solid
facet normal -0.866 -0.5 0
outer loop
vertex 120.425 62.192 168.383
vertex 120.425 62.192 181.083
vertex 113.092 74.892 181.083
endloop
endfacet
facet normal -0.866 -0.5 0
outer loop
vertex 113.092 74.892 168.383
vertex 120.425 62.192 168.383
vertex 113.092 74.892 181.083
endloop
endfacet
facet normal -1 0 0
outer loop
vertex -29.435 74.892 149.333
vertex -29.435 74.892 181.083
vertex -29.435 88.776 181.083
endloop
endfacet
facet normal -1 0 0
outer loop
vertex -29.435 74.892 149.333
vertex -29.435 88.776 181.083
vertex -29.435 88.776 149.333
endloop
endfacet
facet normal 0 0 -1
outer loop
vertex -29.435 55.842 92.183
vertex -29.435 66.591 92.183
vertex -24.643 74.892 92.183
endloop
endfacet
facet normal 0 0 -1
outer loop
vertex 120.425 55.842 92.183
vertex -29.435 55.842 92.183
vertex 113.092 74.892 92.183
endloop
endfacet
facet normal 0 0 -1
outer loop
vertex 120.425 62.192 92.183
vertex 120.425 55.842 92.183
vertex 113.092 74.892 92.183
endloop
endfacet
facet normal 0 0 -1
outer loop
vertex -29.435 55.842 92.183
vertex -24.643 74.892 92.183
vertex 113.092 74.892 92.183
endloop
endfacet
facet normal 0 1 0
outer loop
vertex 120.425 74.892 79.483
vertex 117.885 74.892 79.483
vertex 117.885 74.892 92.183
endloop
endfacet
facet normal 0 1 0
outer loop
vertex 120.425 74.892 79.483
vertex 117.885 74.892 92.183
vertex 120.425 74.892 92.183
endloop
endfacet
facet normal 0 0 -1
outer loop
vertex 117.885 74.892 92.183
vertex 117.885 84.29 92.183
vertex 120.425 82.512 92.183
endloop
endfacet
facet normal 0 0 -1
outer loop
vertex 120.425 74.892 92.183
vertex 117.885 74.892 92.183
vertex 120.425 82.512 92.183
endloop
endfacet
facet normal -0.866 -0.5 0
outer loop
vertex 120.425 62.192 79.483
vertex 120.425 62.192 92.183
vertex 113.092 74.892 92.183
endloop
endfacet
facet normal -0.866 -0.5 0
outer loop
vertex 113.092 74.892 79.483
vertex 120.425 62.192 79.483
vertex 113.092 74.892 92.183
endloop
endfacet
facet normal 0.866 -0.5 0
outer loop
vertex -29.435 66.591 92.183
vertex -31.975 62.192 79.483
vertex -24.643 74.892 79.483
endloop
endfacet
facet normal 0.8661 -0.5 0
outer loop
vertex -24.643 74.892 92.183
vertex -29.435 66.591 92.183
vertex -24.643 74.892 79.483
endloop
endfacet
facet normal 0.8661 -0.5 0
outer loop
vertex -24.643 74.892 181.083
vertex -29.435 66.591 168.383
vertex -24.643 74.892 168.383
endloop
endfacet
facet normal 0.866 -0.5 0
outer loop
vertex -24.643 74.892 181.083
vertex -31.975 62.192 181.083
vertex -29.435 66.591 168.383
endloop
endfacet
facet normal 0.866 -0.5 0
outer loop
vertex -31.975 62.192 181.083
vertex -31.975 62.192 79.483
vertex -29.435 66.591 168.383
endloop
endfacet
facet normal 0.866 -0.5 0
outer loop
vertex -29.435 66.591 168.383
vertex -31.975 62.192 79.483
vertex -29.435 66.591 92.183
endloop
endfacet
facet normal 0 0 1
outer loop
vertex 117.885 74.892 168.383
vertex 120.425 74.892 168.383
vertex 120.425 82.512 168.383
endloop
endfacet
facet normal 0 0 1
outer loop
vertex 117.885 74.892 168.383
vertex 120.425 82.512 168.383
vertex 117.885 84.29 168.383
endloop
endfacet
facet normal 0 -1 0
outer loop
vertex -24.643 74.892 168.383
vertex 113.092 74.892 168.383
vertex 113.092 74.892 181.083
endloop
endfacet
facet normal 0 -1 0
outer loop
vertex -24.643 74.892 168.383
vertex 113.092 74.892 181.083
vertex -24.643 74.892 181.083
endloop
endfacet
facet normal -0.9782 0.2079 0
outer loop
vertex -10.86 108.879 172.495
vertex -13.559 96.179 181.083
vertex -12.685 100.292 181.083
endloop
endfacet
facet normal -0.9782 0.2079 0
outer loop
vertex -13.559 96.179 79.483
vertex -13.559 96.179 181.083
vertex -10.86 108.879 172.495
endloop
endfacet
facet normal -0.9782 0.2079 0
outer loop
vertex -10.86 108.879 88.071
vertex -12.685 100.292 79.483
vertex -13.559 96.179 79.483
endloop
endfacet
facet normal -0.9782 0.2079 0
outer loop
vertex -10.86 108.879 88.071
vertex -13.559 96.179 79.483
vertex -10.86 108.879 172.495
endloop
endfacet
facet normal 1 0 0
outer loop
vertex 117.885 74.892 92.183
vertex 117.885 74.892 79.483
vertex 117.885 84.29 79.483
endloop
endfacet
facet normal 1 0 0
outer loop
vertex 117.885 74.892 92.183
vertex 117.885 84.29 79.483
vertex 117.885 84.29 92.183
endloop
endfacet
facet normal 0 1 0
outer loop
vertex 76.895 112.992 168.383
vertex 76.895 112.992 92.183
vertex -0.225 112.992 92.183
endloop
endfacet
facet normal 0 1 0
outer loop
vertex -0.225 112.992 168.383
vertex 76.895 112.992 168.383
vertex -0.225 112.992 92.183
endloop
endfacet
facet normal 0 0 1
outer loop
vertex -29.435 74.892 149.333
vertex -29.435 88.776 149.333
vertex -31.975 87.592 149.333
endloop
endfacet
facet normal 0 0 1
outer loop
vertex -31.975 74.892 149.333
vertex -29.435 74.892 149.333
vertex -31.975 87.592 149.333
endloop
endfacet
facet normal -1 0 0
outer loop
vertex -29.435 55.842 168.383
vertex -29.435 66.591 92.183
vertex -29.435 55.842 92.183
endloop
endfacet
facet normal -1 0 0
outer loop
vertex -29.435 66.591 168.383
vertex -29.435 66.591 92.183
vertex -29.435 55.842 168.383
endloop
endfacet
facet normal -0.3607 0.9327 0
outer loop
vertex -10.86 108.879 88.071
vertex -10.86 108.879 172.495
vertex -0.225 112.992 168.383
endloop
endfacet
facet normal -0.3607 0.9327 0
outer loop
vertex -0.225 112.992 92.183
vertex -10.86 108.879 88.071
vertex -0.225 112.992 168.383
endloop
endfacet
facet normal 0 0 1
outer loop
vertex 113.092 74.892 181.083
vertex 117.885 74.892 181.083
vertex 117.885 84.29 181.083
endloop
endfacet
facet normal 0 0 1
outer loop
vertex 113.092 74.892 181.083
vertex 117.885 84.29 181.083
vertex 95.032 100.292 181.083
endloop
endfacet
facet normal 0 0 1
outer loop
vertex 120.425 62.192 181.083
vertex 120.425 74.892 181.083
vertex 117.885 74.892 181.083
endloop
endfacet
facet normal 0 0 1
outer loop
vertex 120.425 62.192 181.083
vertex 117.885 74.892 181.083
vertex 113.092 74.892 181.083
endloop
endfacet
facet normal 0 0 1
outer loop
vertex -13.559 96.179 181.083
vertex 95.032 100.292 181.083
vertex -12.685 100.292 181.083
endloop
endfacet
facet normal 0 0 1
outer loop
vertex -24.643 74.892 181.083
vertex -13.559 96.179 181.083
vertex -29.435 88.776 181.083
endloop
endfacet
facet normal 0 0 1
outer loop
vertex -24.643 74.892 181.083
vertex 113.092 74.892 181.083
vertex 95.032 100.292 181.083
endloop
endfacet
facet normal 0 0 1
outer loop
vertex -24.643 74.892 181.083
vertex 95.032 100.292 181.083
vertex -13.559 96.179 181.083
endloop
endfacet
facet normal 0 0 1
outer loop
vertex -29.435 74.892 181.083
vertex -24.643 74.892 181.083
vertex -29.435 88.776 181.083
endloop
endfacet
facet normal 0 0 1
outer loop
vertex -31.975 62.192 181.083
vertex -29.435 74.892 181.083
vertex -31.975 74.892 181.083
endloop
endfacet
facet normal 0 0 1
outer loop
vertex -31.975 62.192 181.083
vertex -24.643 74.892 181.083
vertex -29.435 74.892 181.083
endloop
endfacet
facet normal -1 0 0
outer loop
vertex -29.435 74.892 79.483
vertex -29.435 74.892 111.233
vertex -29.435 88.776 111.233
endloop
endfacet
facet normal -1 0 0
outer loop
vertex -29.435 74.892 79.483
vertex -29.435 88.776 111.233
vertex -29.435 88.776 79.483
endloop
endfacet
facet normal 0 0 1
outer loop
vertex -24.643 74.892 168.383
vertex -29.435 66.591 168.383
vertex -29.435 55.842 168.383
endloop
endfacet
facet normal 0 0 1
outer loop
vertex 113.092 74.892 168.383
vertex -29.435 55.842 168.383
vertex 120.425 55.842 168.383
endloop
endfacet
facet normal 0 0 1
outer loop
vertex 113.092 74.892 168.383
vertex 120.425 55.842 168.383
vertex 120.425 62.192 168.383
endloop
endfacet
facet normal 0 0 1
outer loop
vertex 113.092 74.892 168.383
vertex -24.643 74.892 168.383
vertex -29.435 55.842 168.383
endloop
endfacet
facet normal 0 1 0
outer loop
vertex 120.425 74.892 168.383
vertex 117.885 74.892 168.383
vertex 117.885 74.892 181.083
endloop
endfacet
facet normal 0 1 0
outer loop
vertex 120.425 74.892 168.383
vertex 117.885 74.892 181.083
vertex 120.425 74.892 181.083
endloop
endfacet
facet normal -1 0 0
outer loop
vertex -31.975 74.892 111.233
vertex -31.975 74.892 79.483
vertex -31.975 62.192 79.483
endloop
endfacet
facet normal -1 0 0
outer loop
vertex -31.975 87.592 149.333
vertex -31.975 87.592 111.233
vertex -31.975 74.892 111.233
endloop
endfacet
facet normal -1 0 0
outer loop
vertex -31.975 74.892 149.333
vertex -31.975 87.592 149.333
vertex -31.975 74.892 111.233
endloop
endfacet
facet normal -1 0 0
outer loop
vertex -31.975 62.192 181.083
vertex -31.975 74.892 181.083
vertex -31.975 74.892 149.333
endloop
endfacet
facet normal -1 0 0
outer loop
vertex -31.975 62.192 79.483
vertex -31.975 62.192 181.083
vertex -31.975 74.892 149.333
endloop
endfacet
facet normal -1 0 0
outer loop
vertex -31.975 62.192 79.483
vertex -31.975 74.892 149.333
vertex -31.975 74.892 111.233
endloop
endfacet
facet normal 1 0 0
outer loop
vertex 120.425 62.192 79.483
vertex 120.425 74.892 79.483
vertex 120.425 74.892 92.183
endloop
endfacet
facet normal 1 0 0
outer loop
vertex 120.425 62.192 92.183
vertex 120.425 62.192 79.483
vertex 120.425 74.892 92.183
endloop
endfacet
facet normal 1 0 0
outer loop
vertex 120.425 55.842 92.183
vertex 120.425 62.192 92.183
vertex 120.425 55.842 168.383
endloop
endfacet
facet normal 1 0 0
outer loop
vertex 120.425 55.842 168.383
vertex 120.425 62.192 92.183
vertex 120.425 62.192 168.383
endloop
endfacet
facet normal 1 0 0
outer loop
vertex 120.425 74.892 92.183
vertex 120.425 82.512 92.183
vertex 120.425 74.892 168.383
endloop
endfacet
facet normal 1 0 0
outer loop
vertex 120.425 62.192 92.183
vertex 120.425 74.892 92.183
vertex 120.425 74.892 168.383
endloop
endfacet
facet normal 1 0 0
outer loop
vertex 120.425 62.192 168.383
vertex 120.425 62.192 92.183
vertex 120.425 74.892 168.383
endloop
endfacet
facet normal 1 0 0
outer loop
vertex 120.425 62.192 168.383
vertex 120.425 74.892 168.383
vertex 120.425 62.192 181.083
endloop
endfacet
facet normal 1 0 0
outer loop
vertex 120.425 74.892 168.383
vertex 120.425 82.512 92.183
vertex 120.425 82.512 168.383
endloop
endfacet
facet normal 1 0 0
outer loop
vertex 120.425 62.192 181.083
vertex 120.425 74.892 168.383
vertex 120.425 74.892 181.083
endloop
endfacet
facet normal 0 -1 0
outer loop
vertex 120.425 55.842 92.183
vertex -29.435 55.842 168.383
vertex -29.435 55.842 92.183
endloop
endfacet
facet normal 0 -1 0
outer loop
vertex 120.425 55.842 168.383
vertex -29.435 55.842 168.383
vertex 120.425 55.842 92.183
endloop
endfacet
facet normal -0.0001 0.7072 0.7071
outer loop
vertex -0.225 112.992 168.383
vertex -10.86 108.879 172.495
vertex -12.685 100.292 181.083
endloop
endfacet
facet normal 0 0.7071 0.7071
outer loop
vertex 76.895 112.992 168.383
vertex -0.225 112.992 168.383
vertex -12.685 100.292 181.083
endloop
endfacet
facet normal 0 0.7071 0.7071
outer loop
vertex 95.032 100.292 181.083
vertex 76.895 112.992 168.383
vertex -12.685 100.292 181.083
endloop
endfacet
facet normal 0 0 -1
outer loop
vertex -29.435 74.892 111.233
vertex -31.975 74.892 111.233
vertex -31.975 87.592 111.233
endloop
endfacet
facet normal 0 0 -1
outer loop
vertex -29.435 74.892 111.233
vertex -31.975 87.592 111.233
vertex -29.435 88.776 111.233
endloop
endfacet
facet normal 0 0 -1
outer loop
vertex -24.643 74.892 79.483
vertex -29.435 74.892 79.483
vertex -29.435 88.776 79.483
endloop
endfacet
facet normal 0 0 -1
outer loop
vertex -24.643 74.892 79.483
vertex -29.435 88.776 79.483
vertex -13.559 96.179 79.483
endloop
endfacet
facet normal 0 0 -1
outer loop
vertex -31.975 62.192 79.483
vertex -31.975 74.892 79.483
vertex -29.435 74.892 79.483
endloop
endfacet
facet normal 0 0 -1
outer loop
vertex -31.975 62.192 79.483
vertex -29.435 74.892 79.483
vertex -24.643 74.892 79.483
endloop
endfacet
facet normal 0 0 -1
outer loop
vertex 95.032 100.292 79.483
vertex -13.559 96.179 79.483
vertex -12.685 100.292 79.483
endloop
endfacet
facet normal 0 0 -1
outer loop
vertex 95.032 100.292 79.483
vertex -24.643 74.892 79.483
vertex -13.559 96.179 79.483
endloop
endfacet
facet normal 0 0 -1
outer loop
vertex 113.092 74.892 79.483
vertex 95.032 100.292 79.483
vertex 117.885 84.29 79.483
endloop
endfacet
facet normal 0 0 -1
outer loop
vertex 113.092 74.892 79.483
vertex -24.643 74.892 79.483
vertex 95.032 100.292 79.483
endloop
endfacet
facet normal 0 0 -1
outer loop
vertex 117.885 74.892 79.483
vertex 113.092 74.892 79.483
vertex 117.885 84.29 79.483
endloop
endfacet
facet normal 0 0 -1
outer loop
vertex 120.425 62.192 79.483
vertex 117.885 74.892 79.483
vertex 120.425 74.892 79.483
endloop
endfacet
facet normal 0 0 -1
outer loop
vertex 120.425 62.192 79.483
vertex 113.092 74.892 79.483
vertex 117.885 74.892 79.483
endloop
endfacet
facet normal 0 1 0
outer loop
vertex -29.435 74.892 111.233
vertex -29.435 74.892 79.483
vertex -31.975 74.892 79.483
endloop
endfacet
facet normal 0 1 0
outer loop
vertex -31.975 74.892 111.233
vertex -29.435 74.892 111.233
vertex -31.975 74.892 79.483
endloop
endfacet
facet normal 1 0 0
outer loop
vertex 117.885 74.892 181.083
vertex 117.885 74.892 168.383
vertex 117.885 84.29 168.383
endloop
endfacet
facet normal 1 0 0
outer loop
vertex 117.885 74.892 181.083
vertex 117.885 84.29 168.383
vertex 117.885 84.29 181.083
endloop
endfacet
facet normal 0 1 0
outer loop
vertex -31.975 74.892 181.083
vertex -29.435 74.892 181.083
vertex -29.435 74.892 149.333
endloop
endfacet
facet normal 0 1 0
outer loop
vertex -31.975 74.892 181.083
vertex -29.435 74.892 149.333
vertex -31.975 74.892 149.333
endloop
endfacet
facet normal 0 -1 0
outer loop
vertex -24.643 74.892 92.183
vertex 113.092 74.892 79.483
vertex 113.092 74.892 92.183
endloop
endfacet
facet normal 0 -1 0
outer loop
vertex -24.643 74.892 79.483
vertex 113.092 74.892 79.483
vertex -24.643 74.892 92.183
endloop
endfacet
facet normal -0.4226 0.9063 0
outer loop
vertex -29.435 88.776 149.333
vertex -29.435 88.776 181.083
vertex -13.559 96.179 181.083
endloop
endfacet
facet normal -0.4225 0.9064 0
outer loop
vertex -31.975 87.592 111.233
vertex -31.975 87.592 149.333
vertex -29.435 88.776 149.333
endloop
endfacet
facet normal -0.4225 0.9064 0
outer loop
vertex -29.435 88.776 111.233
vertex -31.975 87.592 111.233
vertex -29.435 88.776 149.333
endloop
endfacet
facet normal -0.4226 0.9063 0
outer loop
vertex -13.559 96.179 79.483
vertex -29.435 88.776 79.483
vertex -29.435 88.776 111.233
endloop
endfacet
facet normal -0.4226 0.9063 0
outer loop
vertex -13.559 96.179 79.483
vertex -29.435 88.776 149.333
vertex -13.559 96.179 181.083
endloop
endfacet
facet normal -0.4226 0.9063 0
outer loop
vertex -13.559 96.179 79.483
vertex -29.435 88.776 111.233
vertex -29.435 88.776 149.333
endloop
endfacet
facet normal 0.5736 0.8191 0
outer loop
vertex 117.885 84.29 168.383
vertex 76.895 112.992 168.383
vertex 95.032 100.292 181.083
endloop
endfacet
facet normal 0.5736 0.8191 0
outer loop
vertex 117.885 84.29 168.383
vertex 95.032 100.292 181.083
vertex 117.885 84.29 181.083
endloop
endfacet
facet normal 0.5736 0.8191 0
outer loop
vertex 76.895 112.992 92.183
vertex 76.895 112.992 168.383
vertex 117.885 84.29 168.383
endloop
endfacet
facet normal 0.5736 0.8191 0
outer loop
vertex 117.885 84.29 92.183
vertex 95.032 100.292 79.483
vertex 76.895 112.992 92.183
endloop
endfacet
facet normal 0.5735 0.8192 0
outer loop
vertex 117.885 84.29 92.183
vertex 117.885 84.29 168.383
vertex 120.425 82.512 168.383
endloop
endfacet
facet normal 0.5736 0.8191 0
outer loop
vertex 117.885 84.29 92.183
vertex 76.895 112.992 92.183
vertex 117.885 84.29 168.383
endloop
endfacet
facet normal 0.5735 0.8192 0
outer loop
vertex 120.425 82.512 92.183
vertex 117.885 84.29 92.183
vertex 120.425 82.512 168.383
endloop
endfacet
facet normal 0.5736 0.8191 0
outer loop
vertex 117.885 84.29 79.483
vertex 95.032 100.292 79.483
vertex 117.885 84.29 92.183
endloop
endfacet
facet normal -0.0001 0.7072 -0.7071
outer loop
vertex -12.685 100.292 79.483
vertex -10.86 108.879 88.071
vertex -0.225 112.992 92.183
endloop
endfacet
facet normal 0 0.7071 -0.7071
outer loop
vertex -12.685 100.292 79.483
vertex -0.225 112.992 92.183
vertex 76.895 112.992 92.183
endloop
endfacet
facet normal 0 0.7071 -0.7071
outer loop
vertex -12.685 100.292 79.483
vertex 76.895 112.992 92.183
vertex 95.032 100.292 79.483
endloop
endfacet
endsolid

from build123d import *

# Parameters (mm, degrees)
BOSS_EXTRUDE1_DEPTH             = 38.1
CUT_EXTRUDE1_DEPTH              = 100.190170884
CUT_EXTRUDE1_DEPTH_BACK         = 100.190170884
BOSS_EXTRUDE2_REACH             = 101.19
BOSS_EXTRUDE2_DIRECTION_2_REACH = 101.19
CUT_EXTRUDE2_DEPTH              = 100.190170884
CUT_EXTRUDE2_DEPTH_BACK         = 100.190170884
SKETCH5_W                       = 149.86
SKETCH5_H                       = 76.2
BOSS_EXTRUDE4_DEPTH             = 19.05


with BuildPart() as part:
    # Sketch1 → Boss-Extrude1 (new body)
    with BuildSketch(Plane(origin=(44.224720049, 74.891650501, 130.282900288), x_dir=(1, 0, 0), z_dir=(0, 1, 0))):
        Polygon((-73.66, -50.8), (-73.66, -19.05), (-76.2, -19.05), (-76.2, 19.05), (-73.66, 19.05), (-73.66, 50.8), (73.66, 50.8), (73.66, 38.1), (76.2, 38.1), (76.2, -38.1), (73.66, -38.1), (73.66, -50.8), align=None)
    extrude(amount=BOSS_EXTRUDE1_DEPTH)

    # Sketch2 → Cut-Extrude1 (cut, two sides: drawn at the far end of the back side and taken through both)
    with BuildSketch(Plane(origin=(44.224720049, 74.891650501, 130.282900288), x_dir=(1, 0, 0), z_dir=(0, 0, 1)).offset(-CUT_EXTRUDE1_DEPTH_BACK)):
        Polygon((-76.2, 12.7), (-57.783825767, 21.287603079), (-55.084357434, 33.987603079), (-44.45, 38.1), (-76.2, 38.1), align=None)
        Polygon((32.670048754, 38.1), (76.2, 7.62), (76.2, 38.1), align=None)
    extrude(amount=CUT_EXTRUDE1_DEPTH + CUT_EXTRUDE1_DEPTH_BACK, mode=Mode.SUBTRACT)

    # Boss-Extrude2: up to this face of the body (flat: up to its plane)
    boss_extrude2_end = Plane(part.part.faces().sort_by_distance((41.857775963, 91.970339861, 181.082900288))[0])
    # Sketch3 → Boss-Extrude2 (add, up to the picked face)
    with BuildSketch(Plane(origin=(44.224720049, 74.891650501, 130.282900288), x_dir=(1, 0, 0), z_dir=(0, 0, 1)), mode=Mode.PRIVATE) as boss_extrude2_sk1:
        Polygon((-76.2, 0), (-76.2, -12.7), (-68.867651581, 0), align=None)
    boss_extrude2_tool1 = split(extrude(boss_extrude2_sk1.sketch, amount=BOSS_EXTRUDE2_REACH, mode=Mode.PRIVATE), bisect_by=boss_extrude2_end, keep=Keep.BOTH, mode=Mode.PRIVATE)
    # Sketch3 → Boss-Extrude2 (add, up to the picked face)
    with BuildSketch(Plane(origin=(44.224720049, 74.891650501, 130.282900288), x_dir=(1, 0, 0), z_dir=(0, 0, 1)), mode=Mode.PRIVATE) as boss_extrude2_sk2:
        Polygon((76.2, 0), (76.2, -12.7), (68.867651581, 0), align=None)
    boss_extrude2_tool2 = split(extrude(boss_extrude2_sk2.sketch, amount=BOSS_EXTRUDE2_REACH, mode=Mode.PRIVATE), bisect_by=boss_extrude2_end, keep=Keep.BOTH, mode=Mode.PRIVATE)
    add(boss_extrude2_tool1.solids().sort_by(Axis((-29.531164, 70.658317, 130.2829), (0, 0, 1)))[0])
    add(boss_extrude2_tool2.solids().sort_by(Axis((117.980604, 70.658317, 130.2829), (0, 0, 1)))[0])

    # Boss-Extrude2 direction 2: up to this face of the body (flat: up to its plane)
    boss_extrude2_direction_2_end = Plane(part.part.faces().sort_by_distance((41.857775963, 91.970339861, 79.482900288))[0])
    # Sketch3 → Boss-Extrude2 direction 2 (add, up to the picked face)
    with BuildSketch(Plane(origin=(44.224720049, 74.891650501, 130.282900288), x_dir=(1, 0, 0), z_dir=(0, 0, 1)), mode=Mode.PRIVATE) as boss_extrude2_direction_2_sk1:
        Polygon((-76.2, 0), (-76.2, -12.7), (-68.867651581, 0), align=None)
    boss_extrude2_direction_2_tool1 = split(extrude(boss_extrude2_direction_2_sk1.sketch, amount=-BOSS_EXTRUDE2_DIRECTION_2_REACH, mode=Mode.PRIVATE), bisect_by=boss_extrude2_direction_2_end, keep=Keep.BOTH, mode=Mode.PRIVATE)
    # Sketch3 → Boss-Extrude2 direction 2 (add, up to the picked face)
    with BuildSketch(Plane(origin=(44.224720049, 74.891650501, 130.282900288), x_dir=(1, 0, 0), z_dir=(0, 0, 1)), mode=Mode.PRIVATE) as boss_extrude2_direction_2_sk2:
        Polygon((76.2, 0), (76.2, -12.7), (68.867651581, 0), align=None)
    boss_extrude2_direction_2_tool2 = split(extrude(boss_extrude2_direction_2_sk2.sketch, amount=-BOSS_EXTRUDE2_DIRECTION_2_REACH, mode=Mode.PRIVATE), bisect_by=boss_extrude2_direction_2_end, keep=Keep.BOTH, mode=Mode.PRIVATE)
    add(boss_extrude2_direction_2_tool1.solids().sort_by(Axis((-29.531164, 70.658317, 130.2829), (0, 0, -1)))[0])
    add(boss_extrude2_direction_2_tool2.solids().sort_by(Axis((117.980604, 70.658317, 130.2829), (0, 0, -1)))[0])

    # Sketch4 → Cut-Extrude2 (cut, two sides: drawn at the far end of the back side and taken through both)
    with BuildSketch(Plane(origin=(44.224720049, 74.891650501, 130.282900288), x_dir=(0, 0, -1), z_dir=(1, 0, 0)).offset(-CUT_EXTRUDE2_DEPTH_BACK)):
        Polygon((-38.1, 38.1), (-50.8, 25.4), (-50.8, 38.1), align=None)
        Polygon((38.1, 38.1), (50.8, 25.4), (50.8, 38.1), align=None)
    extrude(amount=CUT_EXTRUDE2_DEPTH + CUT_EXTRUDE2_DEPTH_BACK, mode=Mode.SUBTRACT)

    # Sketch5 → Boss-Extrude4 (add)
    with BuildSketch(Plane.XZ.offset(-74.891650501)):
        with Locations((45.494720049, 130.282900288)):
            Rectangle(SKETCH5_W, SKETCH5_H)
    extrude(amount=BOSS_EXTRUDE4_DEPTH)


solid = part.part
